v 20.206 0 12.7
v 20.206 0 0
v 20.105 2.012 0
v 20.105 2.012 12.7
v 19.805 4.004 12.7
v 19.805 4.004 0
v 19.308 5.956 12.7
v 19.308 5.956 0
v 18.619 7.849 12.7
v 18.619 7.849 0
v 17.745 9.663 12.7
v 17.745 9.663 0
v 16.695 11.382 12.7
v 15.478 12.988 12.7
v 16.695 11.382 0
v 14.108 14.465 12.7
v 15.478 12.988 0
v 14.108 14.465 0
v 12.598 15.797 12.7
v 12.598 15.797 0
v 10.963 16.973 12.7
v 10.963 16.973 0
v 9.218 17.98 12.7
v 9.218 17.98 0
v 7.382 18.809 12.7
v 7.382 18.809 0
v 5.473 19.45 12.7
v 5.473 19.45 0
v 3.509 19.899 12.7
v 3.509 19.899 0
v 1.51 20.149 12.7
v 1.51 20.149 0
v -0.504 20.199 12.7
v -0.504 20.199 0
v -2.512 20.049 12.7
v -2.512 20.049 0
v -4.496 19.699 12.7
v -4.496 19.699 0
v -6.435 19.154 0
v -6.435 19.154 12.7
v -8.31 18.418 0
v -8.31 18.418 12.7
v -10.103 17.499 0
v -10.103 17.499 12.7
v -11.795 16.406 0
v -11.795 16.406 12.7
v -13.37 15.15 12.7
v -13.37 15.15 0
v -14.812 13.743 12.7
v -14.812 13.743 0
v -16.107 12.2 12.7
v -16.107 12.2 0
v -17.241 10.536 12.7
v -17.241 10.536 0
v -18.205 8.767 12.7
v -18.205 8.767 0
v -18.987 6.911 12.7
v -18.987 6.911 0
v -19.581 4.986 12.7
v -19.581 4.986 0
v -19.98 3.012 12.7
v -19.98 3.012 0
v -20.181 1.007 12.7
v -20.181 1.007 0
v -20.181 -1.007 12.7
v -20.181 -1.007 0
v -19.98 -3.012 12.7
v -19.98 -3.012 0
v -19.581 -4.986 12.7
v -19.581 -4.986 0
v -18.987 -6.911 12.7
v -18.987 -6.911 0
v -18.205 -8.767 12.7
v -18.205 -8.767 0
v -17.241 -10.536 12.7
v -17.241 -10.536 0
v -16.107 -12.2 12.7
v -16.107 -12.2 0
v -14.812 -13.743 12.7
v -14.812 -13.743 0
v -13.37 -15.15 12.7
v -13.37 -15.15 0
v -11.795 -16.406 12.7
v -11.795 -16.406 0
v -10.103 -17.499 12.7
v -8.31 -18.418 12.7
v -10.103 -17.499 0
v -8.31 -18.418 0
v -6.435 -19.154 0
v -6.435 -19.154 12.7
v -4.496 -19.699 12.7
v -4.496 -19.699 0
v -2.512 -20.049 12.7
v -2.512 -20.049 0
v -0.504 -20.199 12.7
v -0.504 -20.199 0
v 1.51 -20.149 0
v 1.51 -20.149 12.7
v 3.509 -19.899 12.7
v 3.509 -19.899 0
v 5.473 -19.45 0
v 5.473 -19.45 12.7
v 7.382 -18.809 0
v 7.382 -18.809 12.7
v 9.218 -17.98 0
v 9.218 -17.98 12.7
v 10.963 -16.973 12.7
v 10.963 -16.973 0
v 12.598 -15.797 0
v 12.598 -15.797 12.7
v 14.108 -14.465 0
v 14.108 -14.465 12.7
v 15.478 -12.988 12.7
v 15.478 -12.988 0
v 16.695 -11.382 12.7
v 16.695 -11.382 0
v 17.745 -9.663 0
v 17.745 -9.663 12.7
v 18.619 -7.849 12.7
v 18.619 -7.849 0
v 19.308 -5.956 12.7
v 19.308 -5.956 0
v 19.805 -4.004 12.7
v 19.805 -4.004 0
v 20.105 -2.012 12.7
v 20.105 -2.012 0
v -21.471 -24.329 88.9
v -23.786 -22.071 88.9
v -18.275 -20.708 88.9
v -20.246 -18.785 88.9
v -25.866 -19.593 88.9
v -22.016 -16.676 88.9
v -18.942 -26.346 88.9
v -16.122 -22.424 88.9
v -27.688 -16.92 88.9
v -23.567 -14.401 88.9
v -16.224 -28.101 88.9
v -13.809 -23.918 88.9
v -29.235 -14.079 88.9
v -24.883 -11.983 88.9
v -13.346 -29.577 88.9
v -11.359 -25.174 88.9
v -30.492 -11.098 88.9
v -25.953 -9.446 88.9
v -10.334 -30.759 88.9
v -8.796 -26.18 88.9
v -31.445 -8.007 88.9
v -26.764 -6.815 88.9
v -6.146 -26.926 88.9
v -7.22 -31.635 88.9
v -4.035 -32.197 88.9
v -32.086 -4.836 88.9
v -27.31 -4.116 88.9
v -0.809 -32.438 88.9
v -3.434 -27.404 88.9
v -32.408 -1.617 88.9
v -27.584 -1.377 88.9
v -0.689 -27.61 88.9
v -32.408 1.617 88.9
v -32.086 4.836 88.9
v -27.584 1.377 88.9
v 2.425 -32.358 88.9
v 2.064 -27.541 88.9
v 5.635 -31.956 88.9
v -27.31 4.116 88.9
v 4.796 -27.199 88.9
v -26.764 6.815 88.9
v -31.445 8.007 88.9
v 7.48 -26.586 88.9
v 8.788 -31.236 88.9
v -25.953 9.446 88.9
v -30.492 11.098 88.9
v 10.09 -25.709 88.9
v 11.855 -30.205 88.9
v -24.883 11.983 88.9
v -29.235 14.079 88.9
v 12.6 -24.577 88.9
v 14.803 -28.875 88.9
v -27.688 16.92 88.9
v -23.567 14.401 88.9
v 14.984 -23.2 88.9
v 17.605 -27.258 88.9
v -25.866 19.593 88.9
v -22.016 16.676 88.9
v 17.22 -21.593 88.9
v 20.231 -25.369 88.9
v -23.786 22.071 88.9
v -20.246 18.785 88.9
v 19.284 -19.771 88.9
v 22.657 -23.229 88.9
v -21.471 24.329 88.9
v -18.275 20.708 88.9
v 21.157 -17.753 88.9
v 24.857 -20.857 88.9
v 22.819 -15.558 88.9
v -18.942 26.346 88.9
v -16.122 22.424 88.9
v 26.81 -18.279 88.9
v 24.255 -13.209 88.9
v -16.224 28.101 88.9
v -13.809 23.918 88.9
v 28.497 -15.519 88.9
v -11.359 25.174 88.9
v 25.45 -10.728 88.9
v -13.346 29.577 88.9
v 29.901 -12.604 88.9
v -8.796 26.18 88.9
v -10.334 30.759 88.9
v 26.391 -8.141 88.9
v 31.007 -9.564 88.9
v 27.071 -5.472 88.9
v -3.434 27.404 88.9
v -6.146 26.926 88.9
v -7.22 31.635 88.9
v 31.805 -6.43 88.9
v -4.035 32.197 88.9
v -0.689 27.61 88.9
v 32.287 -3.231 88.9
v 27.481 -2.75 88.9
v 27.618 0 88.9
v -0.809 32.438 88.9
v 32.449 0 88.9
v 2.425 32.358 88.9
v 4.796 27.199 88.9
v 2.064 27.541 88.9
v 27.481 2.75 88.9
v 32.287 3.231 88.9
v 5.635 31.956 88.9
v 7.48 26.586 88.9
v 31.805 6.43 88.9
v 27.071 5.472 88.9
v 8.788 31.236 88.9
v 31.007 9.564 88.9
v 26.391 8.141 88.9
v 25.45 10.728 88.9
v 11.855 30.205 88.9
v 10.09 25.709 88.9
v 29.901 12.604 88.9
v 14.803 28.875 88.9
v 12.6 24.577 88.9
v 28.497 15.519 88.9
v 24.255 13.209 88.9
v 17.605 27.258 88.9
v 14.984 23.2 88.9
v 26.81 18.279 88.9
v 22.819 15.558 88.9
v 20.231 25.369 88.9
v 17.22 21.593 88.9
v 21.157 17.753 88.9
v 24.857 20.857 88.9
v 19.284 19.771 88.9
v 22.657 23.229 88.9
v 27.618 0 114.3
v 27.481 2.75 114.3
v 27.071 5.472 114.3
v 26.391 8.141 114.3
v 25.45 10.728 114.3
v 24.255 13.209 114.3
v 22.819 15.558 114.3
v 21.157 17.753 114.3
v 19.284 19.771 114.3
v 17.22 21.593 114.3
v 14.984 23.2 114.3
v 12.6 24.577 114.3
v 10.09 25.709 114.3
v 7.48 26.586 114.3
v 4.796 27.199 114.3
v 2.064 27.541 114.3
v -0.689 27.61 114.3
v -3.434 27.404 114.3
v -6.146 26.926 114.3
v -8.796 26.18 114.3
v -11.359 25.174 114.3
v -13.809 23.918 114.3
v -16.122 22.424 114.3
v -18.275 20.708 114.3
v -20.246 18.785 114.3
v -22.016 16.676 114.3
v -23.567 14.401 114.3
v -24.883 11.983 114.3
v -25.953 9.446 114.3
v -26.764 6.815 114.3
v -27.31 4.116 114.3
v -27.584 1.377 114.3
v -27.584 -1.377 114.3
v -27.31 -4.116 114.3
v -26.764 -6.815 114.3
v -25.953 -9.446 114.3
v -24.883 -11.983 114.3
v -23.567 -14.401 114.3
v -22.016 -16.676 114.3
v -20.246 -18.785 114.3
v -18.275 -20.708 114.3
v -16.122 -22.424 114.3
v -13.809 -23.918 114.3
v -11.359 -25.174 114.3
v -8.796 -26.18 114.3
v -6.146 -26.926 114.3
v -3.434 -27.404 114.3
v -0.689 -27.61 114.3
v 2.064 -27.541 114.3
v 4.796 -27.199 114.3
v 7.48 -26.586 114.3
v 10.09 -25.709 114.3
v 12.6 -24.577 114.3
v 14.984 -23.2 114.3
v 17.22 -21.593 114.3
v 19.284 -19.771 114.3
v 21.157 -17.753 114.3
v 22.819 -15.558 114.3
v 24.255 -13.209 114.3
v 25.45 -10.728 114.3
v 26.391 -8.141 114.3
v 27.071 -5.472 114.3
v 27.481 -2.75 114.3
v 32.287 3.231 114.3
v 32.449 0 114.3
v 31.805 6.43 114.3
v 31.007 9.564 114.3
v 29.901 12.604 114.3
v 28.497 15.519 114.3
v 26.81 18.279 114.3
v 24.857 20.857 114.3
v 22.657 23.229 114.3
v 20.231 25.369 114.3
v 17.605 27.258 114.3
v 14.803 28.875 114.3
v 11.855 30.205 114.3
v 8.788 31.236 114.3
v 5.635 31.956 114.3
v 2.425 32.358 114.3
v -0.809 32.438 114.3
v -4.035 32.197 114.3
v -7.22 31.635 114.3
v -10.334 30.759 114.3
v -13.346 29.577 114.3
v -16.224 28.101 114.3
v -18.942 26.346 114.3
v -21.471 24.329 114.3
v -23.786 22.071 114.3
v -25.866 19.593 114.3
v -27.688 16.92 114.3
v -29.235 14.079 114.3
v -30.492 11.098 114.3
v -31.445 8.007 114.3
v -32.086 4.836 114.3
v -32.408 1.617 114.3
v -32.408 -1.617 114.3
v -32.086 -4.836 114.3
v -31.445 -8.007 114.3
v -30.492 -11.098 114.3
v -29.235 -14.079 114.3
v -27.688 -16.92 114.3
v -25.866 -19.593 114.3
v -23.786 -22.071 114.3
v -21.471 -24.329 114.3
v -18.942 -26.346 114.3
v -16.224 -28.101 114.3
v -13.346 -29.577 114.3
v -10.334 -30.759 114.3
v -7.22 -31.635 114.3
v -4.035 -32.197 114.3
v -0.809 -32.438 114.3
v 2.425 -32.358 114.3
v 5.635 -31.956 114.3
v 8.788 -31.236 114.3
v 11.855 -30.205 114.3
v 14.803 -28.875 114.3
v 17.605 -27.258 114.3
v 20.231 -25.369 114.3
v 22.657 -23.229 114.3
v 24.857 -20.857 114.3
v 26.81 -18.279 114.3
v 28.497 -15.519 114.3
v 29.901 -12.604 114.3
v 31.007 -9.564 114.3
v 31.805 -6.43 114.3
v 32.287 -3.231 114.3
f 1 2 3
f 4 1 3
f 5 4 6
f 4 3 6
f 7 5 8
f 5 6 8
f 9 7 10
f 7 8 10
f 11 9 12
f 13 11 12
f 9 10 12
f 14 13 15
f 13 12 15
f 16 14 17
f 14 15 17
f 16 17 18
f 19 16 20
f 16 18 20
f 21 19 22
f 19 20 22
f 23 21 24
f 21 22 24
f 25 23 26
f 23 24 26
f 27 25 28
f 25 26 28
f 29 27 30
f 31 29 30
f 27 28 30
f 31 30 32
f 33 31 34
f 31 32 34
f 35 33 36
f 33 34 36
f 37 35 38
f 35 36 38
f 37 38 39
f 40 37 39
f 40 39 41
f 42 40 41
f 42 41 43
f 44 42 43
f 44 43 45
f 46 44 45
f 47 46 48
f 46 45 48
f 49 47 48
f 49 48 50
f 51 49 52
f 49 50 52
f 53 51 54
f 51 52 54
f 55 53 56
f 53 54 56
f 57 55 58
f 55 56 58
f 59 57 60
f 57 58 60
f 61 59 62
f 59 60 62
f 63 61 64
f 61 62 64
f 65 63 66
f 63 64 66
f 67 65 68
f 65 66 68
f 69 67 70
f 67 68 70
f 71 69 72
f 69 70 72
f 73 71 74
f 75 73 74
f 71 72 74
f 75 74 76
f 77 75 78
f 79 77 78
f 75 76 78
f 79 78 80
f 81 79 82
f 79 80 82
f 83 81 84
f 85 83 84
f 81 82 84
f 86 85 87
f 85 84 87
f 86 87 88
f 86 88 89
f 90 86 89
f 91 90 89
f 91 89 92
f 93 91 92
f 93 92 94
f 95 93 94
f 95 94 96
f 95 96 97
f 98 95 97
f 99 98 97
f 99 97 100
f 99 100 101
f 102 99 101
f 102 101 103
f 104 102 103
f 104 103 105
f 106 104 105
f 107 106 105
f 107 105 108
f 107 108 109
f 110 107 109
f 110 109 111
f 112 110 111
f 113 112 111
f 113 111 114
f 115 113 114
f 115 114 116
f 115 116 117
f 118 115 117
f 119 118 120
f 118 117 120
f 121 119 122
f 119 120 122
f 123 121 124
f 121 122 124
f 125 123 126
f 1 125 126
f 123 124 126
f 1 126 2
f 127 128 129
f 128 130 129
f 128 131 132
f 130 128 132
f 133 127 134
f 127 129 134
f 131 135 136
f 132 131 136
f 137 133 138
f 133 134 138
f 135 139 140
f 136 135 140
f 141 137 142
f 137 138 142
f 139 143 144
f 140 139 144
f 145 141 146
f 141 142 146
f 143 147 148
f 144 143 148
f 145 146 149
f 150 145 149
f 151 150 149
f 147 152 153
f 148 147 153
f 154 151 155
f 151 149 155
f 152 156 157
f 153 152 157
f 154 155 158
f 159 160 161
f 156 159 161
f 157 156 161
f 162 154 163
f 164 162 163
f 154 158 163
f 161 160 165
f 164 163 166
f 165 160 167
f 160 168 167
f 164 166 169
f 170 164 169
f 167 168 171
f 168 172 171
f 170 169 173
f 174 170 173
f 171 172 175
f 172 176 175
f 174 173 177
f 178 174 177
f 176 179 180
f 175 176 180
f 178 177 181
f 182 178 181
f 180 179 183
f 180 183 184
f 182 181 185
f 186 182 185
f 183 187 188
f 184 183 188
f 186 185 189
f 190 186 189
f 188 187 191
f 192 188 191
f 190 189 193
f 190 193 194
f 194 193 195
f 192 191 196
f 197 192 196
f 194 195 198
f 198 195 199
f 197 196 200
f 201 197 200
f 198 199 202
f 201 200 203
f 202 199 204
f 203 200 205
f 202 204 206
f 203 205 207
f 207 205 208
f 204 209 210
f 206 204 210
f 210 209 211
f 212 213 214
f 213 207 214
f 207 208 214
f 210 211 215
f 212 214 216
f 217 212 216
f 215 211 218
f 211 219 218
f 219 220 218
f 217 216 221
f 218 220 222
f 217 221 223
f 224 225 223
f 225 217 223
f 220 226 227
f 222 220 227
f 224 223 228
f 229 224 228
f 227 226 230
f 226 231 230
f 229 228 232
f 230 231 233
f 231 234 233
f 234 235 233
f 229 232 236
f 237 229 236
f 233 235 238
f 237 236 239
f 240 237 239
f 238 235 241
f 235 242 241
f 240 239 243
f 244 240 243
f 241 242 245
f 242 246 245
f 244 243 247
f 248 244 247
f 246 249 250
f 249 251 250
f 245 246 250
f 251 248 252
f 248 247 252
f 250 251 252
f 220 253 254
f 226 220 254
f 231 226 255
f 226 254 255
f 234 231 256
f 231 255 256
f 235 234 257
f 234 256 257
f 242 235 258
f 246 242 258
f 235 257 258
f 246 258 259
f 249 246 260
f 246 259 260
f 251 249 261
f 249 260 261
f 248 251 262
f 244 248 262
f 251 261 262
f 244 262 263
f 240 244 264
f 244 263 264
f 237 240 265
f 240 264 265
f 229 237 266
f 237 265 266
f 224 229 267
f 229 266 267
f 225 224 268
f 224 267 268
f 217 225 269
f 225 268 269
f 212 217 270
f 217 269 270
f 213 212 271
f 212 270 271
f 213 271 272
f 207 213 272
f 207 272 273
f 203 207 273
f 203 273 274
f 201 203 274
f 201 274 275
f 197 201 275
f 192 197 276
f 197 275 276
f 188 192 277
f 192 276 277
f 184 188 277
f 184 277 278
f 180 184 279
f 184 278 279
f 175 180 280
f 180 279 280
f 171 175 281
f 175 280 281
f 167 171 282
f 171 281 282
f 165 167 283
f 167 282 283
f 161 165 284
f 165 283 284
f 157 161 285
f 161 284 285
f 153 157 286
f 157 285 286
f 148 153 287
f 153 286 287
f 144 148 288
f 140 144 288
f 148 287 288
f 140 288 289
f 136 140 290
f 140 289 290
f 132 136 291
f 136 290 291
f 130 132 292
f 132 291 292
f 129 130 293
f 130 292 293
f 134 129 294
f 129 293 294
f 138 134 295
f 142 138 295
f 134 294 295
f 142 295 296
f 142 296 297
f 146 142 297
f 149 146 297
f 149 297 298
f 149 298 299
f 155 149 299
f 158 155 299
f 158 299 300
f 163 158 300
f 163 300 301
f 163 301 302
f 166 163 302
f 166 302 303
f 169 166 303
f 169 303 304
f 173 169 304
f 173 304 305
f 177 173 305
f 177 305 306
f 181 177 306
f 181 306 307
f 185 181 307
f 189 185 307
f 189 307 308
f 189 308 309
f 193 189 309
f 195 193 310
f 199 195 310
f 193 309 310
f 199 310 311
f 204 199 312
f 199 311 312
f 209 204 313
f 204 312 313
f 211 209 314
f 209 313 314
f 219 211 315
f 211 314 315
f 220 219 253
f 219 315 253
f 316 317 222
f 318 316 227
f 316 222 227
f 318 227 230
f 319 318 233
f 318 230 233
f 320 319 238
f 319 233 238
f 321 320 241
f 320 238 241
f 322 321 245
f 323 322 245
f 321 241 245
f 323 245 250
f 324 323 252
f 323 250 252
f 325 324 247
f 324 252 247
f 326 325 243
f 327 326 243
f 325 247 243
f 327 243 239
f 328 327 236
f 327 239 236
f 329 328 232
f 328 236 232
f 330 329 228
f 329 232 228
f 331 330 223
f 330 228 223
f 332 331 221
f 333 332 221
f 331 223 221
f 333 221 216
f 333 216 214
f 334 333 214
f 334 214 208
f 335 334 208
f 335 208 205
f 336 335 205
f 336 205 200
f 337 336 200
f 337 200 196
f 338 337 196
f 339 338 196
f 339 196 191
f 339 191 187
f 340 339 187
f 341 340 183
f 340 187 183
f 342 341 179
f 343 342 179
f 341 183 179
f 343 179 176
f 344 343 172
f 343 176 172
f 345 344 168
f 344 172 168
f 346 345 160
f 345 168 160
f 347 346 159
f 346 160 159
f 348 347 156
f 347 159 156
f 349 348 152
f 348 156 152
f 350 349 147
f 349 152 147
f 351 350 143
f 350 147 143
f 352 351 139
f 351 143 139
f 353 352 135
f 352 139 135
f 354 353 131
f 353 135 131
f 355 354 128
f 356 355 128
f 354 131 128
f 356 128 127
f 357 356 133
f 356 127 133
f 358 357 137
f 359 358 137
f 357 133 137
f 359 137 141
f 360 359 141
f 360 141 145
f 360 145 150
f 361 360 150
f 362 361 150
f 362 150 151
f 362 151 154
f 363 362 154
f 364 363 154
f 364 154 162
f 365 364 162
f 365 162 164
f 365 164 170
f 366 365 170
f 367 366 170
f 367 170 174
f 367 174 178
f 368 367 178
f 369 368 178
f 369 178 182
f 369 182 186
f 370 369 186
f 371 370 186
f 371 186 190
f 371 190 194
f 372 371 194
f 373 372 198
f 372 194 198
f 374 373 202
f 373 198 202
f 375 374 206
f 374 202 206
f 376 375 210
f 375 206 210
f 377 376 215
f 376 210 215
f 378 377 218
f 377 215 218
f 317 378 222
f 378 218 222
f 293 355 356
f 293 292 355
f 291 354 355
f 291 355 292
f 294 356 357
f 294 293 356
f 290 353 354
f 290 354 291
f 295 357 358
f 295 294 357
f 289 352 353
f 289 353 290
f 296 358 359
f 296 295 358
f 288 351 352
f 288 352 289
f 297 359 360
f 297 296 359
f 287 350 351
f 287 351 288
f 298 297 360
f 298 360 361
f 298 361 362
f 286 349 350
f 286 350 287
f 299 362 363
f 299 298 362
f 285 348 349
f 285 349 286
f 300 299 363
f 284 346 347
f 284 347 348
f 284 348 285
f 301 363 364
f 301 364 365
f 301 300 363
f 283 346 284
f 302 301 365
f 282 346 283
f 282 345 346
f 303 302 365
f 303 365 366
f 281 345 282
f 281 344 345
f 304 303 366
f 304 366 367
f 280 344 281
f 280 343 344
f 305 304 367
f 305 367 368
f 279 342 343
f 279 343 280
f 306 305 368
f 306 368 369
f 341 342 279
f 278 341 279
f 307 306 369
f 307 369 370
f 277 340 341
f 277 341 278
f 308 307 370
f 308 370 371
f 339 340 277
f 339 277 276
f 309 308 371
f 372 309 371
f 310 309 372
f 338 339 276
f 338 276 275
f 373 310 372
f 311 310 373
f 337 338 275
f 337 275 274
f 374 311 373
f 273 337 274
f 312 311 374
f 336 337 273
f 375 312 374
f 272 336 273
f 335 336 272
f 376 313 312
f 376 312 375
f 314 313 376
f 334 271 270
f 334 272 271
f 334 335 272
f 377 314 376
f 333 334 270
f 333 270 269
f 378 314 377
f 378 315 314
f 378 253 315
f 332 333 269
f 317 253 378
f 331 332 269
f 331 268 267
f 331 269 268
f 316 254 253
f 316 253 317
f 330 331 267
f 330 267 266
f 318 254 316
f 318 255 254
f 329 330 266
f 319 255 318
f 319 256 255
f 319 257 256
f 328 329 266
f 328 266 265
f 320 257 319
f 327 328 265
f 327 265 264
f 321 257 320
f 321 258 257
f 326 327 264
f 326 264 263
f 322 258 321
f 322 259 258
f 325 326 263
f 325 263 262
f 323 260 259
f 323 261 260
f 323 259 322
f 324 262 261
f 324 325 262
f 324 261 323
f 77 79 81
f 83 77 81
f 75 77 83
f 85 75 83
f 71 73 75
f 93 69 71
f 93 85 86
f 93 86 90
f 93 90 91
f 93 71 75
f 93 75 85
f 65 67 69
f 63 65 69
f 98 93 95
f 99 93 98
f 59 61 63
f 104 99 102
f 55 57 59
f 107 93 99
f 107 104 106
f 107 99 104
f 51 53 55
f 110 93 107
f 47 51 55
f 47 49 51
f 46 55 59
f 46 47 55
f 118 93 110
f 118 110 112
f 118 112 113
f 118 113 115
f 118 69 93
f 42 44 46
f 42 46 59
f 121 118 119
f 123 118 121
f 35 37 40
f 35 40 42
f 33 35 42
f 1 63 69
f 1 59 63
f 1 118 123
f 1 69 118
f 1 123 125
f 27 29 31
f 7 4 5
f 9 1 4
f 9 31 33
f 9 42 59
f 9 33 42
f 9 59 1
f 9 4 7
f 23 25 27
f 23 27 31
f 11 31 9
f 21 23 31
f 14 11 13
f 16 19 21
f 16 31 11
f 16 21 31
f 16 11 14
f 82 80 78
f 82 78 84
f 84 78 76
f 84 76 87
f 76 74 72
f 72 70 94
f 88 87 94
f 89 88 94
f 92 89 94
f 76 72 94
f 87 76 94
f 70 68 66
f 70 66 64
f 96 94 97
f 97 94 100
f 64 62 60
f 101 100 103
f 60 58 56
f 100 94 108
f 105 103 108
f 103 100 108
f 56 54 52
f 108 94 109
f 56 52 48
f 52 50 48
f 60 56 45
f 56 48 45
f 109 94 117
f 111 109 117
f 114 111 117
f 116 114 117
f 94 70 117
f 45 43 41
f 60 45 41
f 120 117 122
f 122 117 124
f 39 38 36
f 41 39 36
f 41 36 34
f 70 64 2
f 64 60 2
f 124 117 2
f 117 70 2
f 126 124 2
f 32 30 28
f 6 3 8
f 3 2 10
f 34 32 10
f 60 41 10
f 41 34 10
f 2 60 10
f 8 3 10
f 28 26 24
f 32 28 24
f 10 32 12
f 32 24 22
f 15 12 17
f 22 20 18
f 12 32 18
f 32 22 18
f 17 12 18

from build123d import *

# Parameters (mm, degrees)
F0_R     = 20.2057
F1_DEPTH = 12.7
F3_R     = 32.4485
F4_DEPTH = 25.4
F6_R     = 27.6183785492
F7_DEPTH = 25.4


# Not quite as in the source:
# - the program builds the solid bodies; features that only make, move or delete a surface that nothing else refers to are left out


with BuildPart() as f1:
    # F0 (on Top) → F1 (new body)
    with BuildSketch(Plane.XY):
        Circle(F0_R)
    extrude(amount=F1_DEPTH)


with BuildPart() as f4:
    # F3 (on offset) → F4 (new body)
    with BuildSketch(Plane.XY.offset(88.9)):
        Circle(F3_R)
    extrude(amount=F4_DEPTH)

    # F6 (on face) → F7 (cut)
    with BuildSketch(Plane.XY.offset(114.3)):
        Circle(F6_R)
    extrude(amount=-F7_DEPTH, mode=Mode.SUBTRACT)


solid = Compound([f1.part, f4.part])
